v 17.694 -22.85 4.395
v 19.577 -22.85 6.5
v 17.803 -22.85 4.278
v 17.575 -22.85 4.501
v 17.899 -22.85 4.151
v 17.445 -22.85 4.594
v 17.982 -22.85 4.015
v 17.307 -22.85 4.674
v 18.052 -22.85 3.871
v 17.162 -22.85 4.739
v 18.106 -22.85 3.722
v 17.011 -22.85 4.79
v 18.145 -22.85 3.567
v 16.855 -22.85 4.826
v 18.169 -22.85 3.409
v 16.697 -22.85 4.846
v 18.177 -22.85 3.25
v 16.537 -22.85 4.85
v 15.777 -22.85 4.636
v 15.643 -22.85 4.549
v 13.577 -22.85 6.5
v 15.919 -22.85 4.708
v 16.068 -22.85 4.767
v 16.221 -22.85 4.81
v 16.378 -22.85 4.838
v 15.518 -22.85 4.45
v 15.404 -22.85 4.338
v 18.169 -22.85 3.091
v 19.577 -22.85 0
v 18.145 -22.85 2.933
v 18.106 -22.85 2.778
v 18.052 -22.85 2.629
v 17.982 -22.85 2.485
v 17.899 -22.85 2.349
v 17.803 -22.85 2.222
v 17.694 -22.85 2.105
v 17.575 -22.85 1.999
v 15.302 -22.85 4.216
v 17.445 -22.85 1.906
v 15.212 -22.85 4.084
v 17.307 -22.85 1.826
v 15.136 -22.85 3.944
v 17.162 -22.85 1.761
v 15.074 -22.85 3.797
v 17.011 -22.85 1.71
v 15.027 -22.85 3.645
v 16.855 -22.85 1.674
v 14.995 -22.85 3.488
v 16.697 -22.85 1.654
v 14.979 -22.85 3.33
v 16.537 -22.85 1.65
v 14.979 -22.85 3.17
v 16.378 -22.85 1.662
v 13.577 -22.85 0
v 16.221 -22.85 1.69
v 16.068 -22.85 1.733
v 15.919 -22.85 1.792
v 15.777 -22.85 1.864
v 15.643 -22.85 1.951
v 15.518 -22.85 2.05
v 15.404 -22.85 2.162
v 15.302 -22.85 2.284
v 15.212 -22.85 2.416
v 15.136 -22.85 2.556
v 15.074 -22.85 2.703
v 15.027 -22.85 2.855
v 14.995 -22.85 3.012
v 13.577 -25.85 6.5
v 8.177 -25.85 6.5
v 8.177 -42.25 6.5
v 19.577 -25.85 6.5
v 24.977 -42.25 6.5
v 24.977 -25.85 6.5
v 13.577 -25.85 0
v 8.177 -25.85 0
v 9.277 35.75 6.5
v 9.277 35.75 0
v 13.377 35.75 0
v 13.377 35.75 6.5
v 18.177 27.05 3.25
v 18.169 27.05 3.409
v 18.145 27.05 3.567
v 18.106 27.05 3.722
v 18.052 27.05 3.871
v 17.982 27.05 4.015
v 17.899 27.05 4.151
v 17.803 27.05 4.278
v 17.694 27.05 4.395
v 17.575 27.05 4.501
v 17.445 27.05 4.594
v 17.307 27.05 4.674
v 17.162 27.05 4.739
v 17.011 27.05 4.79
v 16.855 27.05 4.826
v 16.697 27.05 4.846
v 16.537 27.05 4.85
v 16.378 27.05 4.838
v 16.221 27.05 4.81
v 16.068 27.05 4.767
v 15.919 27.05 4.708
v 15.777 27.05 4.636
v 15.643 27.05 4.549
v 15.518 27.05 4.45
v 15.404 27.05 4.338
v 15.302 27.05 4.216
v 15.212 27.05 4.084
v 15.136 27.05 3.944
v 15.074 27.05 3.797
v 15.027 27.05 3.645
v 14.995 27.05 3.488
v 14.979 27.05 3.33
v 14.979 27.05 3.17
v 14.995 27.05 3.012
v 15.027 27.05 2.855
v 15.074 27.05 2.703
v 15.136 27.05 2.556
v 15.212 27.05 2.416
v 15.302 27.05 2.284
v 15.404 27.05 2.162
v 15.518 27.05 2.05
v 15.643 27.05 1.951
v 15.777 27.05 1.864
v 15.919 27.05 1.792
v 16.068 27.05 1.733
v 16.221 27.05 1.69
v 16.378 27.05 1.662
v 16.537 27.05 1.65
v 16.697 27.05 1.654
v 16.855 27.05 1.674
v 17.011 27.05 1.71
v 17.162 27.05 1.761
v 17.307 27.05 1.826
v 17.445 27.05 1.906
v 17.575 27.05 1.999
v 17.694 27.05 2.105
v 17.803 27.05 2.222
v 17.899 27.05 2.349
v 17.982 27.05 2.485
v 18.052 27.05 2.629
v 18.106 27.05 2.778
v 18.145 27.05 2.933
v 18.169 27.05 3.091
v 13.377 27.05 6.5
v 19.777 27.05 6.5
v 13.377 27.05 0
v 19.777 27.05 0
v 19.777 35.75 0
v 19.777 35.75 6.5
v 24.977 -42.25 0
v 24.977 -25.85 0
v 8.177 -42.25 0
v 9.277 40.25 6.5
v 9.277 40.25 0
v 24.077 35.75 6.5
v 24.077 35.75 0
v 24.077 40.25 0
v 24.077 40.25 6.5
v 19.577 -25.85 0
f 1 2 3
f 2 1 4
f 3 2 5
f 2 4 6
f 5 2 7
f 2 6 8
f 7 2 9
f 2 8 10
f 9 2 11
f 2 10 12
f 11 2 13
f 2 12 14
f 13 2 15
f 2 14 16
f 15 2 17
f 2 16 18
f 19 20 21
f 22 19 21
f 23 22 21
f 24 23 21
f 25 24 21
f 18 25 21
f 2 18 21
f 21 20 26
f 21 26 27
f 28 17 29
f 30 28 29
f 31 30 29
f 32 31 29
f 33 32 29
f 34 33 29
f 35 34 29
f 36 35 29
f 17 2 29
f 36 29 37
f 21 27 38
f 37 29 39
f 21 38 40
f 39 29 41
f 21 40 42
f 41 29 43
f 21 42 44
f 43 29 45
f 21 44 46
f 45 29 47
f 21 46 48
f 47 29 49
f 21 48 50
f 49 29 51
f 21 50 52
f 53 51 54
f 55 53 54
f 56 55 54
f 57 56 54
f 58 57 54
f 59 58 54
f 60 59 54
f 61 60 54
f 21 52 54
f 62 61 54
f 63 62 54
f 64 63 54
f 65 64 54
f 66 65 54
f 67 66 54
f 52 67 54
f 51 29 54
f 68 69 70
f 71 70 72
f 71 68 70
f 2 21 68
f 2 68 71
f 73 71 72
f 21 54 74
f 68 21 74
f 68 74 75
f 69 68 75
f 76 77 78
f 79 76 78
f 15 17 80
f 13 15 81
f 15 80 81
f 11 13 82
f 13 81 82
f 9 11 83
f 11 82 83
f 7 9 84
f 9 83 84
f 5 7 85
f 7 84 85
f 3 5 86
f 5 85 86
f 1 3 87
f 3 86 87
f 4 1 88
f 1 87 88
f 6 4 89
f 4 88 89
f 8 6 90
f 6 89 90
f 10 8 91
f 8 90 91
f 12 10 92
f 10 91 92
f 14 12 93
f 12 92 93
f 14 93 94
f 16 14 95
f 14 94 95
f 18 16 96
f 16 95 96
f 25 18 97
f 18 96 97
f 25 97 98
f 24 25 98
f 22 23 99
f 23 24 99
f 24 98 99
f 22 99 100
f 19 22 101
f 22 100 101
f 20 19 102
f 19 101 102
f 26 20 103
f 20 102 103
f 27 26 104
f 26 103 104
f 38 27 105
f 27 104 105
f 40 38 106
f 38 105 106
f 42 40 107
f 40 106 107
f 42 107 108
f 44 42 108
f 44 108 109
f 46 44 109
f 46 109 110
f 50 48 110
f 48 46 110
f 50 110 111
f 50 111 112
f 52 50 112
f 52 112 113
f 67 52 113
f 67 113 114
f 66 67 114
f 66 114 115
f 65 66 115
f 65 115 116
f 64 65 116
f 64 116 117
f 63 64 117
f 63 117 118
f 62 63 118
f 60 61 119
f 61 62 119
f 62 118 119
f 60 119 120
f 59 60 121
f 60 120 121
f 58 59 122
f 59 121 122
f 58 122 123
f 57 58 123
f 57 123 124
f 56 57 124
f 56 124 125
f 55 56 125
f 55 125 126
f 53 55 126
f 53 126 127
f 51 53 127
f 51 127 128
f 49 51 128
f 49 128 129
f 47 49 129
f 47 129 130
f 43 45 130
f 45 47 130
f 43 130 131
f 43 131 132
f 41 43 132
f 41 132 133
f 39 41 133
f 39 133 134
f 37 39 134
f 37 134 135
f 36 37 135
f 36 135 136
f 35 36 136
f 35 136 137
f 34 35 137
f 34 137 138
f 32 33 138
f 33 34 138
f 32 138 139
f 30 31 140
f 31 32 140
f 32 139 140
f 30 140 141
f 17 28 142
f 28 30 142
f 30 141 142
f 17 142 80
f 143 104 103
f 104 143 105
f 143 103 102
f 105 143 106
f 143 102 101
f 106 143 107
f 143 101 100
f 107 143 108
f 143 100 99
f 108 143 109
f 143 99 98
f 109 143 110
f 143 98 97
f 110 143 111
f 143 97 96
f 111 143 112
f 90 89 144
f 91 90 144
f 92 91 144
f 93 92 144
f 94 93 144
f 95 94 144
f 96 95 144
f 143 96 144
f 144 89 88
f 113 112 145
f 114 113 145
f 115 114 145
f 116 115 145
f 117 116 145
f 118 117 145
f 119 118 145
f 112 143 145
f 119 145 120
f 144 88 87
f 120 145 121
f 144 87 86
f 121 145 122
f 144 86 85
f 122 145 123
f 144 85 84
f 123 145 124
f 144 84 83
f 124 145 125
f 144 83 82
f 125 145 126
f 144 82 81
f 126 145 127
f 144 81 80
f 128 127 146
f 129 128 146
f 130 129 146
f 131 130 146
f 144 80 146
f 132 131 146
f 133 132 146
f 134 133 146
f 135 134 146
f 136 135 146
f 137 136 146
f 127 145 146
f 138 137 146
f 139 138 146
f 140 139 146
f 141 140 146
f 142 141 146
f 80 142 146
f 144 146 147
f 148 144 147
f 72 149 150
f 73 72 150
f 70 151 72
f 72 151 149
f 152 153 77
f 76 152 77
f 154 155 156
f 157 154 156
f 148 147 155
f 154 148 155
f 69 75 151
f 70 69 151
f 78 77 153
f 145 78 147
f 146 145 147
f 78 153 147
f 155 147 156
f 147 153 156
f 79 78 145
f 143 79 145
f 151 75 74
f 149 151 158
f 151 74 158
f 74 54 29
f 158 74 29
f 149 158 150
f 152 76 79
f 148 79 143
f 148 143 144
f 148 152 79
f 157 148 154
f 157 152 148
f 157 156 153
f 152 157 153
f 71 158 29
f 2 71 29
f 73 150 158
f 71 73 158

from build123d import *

# Parameters (mm, degrees)
BOSS_EXTRUDE1_DEPTH = 6.5
BOSS_EXTRUDE2_DEPTH = 6.5
SKETCH2_R           = 1.6
BOSS_EXTRUDE3_DEPTH = 55


with BuildPart() as part:
    # Sketch1 → Boss-Extrude1 (new body)
    with BuildSketch(Plane.XY):
        Polygon((9.277156847, 35.75), (13.377156847, 35.75), (13.377156847, 27.05), (19.777156847, 27.05), (19.777156847, 35.75), (24.077156847, 35.75), (24.077156847, 40.25), (9.277156847, 40.25), align=None)
    extrude(amount=BOSS_EXTRUDE1_DEPTH)



with BuildPart() as body_2:
    # Sketch1<6> → Boss-Extrude2 (new body)
    with BuildSketch(Plane.XY):
        Polygon((8.177156847, -42.25), (24.977156847, -42.25), (24.977156847, -25.85), (19.577156847, -25.85), (19.577156847, -22.85), (13.577156847, -22.85), (13.577156847, -25.85), (8.177156847, -25.85), align=None)
    extrude(amount=BOSS_EXTRUDE2_DEPTH)


with BuildPart() as part_1:
    add(part.part)

    add(body_2.part)  # Boss-Extrude3 merges body 2
    # Sketch2 → Boss-Extrude3 (add)
    with BuildSketch(Plane.XZ.offset(-27.05)):
        with Locations((16.577156847, 3.25)):
            Circle(SKETCH2_R)
    extrude(amount=BOSS_EXTRUDE3_DEPTH)


solid = part_1.part
